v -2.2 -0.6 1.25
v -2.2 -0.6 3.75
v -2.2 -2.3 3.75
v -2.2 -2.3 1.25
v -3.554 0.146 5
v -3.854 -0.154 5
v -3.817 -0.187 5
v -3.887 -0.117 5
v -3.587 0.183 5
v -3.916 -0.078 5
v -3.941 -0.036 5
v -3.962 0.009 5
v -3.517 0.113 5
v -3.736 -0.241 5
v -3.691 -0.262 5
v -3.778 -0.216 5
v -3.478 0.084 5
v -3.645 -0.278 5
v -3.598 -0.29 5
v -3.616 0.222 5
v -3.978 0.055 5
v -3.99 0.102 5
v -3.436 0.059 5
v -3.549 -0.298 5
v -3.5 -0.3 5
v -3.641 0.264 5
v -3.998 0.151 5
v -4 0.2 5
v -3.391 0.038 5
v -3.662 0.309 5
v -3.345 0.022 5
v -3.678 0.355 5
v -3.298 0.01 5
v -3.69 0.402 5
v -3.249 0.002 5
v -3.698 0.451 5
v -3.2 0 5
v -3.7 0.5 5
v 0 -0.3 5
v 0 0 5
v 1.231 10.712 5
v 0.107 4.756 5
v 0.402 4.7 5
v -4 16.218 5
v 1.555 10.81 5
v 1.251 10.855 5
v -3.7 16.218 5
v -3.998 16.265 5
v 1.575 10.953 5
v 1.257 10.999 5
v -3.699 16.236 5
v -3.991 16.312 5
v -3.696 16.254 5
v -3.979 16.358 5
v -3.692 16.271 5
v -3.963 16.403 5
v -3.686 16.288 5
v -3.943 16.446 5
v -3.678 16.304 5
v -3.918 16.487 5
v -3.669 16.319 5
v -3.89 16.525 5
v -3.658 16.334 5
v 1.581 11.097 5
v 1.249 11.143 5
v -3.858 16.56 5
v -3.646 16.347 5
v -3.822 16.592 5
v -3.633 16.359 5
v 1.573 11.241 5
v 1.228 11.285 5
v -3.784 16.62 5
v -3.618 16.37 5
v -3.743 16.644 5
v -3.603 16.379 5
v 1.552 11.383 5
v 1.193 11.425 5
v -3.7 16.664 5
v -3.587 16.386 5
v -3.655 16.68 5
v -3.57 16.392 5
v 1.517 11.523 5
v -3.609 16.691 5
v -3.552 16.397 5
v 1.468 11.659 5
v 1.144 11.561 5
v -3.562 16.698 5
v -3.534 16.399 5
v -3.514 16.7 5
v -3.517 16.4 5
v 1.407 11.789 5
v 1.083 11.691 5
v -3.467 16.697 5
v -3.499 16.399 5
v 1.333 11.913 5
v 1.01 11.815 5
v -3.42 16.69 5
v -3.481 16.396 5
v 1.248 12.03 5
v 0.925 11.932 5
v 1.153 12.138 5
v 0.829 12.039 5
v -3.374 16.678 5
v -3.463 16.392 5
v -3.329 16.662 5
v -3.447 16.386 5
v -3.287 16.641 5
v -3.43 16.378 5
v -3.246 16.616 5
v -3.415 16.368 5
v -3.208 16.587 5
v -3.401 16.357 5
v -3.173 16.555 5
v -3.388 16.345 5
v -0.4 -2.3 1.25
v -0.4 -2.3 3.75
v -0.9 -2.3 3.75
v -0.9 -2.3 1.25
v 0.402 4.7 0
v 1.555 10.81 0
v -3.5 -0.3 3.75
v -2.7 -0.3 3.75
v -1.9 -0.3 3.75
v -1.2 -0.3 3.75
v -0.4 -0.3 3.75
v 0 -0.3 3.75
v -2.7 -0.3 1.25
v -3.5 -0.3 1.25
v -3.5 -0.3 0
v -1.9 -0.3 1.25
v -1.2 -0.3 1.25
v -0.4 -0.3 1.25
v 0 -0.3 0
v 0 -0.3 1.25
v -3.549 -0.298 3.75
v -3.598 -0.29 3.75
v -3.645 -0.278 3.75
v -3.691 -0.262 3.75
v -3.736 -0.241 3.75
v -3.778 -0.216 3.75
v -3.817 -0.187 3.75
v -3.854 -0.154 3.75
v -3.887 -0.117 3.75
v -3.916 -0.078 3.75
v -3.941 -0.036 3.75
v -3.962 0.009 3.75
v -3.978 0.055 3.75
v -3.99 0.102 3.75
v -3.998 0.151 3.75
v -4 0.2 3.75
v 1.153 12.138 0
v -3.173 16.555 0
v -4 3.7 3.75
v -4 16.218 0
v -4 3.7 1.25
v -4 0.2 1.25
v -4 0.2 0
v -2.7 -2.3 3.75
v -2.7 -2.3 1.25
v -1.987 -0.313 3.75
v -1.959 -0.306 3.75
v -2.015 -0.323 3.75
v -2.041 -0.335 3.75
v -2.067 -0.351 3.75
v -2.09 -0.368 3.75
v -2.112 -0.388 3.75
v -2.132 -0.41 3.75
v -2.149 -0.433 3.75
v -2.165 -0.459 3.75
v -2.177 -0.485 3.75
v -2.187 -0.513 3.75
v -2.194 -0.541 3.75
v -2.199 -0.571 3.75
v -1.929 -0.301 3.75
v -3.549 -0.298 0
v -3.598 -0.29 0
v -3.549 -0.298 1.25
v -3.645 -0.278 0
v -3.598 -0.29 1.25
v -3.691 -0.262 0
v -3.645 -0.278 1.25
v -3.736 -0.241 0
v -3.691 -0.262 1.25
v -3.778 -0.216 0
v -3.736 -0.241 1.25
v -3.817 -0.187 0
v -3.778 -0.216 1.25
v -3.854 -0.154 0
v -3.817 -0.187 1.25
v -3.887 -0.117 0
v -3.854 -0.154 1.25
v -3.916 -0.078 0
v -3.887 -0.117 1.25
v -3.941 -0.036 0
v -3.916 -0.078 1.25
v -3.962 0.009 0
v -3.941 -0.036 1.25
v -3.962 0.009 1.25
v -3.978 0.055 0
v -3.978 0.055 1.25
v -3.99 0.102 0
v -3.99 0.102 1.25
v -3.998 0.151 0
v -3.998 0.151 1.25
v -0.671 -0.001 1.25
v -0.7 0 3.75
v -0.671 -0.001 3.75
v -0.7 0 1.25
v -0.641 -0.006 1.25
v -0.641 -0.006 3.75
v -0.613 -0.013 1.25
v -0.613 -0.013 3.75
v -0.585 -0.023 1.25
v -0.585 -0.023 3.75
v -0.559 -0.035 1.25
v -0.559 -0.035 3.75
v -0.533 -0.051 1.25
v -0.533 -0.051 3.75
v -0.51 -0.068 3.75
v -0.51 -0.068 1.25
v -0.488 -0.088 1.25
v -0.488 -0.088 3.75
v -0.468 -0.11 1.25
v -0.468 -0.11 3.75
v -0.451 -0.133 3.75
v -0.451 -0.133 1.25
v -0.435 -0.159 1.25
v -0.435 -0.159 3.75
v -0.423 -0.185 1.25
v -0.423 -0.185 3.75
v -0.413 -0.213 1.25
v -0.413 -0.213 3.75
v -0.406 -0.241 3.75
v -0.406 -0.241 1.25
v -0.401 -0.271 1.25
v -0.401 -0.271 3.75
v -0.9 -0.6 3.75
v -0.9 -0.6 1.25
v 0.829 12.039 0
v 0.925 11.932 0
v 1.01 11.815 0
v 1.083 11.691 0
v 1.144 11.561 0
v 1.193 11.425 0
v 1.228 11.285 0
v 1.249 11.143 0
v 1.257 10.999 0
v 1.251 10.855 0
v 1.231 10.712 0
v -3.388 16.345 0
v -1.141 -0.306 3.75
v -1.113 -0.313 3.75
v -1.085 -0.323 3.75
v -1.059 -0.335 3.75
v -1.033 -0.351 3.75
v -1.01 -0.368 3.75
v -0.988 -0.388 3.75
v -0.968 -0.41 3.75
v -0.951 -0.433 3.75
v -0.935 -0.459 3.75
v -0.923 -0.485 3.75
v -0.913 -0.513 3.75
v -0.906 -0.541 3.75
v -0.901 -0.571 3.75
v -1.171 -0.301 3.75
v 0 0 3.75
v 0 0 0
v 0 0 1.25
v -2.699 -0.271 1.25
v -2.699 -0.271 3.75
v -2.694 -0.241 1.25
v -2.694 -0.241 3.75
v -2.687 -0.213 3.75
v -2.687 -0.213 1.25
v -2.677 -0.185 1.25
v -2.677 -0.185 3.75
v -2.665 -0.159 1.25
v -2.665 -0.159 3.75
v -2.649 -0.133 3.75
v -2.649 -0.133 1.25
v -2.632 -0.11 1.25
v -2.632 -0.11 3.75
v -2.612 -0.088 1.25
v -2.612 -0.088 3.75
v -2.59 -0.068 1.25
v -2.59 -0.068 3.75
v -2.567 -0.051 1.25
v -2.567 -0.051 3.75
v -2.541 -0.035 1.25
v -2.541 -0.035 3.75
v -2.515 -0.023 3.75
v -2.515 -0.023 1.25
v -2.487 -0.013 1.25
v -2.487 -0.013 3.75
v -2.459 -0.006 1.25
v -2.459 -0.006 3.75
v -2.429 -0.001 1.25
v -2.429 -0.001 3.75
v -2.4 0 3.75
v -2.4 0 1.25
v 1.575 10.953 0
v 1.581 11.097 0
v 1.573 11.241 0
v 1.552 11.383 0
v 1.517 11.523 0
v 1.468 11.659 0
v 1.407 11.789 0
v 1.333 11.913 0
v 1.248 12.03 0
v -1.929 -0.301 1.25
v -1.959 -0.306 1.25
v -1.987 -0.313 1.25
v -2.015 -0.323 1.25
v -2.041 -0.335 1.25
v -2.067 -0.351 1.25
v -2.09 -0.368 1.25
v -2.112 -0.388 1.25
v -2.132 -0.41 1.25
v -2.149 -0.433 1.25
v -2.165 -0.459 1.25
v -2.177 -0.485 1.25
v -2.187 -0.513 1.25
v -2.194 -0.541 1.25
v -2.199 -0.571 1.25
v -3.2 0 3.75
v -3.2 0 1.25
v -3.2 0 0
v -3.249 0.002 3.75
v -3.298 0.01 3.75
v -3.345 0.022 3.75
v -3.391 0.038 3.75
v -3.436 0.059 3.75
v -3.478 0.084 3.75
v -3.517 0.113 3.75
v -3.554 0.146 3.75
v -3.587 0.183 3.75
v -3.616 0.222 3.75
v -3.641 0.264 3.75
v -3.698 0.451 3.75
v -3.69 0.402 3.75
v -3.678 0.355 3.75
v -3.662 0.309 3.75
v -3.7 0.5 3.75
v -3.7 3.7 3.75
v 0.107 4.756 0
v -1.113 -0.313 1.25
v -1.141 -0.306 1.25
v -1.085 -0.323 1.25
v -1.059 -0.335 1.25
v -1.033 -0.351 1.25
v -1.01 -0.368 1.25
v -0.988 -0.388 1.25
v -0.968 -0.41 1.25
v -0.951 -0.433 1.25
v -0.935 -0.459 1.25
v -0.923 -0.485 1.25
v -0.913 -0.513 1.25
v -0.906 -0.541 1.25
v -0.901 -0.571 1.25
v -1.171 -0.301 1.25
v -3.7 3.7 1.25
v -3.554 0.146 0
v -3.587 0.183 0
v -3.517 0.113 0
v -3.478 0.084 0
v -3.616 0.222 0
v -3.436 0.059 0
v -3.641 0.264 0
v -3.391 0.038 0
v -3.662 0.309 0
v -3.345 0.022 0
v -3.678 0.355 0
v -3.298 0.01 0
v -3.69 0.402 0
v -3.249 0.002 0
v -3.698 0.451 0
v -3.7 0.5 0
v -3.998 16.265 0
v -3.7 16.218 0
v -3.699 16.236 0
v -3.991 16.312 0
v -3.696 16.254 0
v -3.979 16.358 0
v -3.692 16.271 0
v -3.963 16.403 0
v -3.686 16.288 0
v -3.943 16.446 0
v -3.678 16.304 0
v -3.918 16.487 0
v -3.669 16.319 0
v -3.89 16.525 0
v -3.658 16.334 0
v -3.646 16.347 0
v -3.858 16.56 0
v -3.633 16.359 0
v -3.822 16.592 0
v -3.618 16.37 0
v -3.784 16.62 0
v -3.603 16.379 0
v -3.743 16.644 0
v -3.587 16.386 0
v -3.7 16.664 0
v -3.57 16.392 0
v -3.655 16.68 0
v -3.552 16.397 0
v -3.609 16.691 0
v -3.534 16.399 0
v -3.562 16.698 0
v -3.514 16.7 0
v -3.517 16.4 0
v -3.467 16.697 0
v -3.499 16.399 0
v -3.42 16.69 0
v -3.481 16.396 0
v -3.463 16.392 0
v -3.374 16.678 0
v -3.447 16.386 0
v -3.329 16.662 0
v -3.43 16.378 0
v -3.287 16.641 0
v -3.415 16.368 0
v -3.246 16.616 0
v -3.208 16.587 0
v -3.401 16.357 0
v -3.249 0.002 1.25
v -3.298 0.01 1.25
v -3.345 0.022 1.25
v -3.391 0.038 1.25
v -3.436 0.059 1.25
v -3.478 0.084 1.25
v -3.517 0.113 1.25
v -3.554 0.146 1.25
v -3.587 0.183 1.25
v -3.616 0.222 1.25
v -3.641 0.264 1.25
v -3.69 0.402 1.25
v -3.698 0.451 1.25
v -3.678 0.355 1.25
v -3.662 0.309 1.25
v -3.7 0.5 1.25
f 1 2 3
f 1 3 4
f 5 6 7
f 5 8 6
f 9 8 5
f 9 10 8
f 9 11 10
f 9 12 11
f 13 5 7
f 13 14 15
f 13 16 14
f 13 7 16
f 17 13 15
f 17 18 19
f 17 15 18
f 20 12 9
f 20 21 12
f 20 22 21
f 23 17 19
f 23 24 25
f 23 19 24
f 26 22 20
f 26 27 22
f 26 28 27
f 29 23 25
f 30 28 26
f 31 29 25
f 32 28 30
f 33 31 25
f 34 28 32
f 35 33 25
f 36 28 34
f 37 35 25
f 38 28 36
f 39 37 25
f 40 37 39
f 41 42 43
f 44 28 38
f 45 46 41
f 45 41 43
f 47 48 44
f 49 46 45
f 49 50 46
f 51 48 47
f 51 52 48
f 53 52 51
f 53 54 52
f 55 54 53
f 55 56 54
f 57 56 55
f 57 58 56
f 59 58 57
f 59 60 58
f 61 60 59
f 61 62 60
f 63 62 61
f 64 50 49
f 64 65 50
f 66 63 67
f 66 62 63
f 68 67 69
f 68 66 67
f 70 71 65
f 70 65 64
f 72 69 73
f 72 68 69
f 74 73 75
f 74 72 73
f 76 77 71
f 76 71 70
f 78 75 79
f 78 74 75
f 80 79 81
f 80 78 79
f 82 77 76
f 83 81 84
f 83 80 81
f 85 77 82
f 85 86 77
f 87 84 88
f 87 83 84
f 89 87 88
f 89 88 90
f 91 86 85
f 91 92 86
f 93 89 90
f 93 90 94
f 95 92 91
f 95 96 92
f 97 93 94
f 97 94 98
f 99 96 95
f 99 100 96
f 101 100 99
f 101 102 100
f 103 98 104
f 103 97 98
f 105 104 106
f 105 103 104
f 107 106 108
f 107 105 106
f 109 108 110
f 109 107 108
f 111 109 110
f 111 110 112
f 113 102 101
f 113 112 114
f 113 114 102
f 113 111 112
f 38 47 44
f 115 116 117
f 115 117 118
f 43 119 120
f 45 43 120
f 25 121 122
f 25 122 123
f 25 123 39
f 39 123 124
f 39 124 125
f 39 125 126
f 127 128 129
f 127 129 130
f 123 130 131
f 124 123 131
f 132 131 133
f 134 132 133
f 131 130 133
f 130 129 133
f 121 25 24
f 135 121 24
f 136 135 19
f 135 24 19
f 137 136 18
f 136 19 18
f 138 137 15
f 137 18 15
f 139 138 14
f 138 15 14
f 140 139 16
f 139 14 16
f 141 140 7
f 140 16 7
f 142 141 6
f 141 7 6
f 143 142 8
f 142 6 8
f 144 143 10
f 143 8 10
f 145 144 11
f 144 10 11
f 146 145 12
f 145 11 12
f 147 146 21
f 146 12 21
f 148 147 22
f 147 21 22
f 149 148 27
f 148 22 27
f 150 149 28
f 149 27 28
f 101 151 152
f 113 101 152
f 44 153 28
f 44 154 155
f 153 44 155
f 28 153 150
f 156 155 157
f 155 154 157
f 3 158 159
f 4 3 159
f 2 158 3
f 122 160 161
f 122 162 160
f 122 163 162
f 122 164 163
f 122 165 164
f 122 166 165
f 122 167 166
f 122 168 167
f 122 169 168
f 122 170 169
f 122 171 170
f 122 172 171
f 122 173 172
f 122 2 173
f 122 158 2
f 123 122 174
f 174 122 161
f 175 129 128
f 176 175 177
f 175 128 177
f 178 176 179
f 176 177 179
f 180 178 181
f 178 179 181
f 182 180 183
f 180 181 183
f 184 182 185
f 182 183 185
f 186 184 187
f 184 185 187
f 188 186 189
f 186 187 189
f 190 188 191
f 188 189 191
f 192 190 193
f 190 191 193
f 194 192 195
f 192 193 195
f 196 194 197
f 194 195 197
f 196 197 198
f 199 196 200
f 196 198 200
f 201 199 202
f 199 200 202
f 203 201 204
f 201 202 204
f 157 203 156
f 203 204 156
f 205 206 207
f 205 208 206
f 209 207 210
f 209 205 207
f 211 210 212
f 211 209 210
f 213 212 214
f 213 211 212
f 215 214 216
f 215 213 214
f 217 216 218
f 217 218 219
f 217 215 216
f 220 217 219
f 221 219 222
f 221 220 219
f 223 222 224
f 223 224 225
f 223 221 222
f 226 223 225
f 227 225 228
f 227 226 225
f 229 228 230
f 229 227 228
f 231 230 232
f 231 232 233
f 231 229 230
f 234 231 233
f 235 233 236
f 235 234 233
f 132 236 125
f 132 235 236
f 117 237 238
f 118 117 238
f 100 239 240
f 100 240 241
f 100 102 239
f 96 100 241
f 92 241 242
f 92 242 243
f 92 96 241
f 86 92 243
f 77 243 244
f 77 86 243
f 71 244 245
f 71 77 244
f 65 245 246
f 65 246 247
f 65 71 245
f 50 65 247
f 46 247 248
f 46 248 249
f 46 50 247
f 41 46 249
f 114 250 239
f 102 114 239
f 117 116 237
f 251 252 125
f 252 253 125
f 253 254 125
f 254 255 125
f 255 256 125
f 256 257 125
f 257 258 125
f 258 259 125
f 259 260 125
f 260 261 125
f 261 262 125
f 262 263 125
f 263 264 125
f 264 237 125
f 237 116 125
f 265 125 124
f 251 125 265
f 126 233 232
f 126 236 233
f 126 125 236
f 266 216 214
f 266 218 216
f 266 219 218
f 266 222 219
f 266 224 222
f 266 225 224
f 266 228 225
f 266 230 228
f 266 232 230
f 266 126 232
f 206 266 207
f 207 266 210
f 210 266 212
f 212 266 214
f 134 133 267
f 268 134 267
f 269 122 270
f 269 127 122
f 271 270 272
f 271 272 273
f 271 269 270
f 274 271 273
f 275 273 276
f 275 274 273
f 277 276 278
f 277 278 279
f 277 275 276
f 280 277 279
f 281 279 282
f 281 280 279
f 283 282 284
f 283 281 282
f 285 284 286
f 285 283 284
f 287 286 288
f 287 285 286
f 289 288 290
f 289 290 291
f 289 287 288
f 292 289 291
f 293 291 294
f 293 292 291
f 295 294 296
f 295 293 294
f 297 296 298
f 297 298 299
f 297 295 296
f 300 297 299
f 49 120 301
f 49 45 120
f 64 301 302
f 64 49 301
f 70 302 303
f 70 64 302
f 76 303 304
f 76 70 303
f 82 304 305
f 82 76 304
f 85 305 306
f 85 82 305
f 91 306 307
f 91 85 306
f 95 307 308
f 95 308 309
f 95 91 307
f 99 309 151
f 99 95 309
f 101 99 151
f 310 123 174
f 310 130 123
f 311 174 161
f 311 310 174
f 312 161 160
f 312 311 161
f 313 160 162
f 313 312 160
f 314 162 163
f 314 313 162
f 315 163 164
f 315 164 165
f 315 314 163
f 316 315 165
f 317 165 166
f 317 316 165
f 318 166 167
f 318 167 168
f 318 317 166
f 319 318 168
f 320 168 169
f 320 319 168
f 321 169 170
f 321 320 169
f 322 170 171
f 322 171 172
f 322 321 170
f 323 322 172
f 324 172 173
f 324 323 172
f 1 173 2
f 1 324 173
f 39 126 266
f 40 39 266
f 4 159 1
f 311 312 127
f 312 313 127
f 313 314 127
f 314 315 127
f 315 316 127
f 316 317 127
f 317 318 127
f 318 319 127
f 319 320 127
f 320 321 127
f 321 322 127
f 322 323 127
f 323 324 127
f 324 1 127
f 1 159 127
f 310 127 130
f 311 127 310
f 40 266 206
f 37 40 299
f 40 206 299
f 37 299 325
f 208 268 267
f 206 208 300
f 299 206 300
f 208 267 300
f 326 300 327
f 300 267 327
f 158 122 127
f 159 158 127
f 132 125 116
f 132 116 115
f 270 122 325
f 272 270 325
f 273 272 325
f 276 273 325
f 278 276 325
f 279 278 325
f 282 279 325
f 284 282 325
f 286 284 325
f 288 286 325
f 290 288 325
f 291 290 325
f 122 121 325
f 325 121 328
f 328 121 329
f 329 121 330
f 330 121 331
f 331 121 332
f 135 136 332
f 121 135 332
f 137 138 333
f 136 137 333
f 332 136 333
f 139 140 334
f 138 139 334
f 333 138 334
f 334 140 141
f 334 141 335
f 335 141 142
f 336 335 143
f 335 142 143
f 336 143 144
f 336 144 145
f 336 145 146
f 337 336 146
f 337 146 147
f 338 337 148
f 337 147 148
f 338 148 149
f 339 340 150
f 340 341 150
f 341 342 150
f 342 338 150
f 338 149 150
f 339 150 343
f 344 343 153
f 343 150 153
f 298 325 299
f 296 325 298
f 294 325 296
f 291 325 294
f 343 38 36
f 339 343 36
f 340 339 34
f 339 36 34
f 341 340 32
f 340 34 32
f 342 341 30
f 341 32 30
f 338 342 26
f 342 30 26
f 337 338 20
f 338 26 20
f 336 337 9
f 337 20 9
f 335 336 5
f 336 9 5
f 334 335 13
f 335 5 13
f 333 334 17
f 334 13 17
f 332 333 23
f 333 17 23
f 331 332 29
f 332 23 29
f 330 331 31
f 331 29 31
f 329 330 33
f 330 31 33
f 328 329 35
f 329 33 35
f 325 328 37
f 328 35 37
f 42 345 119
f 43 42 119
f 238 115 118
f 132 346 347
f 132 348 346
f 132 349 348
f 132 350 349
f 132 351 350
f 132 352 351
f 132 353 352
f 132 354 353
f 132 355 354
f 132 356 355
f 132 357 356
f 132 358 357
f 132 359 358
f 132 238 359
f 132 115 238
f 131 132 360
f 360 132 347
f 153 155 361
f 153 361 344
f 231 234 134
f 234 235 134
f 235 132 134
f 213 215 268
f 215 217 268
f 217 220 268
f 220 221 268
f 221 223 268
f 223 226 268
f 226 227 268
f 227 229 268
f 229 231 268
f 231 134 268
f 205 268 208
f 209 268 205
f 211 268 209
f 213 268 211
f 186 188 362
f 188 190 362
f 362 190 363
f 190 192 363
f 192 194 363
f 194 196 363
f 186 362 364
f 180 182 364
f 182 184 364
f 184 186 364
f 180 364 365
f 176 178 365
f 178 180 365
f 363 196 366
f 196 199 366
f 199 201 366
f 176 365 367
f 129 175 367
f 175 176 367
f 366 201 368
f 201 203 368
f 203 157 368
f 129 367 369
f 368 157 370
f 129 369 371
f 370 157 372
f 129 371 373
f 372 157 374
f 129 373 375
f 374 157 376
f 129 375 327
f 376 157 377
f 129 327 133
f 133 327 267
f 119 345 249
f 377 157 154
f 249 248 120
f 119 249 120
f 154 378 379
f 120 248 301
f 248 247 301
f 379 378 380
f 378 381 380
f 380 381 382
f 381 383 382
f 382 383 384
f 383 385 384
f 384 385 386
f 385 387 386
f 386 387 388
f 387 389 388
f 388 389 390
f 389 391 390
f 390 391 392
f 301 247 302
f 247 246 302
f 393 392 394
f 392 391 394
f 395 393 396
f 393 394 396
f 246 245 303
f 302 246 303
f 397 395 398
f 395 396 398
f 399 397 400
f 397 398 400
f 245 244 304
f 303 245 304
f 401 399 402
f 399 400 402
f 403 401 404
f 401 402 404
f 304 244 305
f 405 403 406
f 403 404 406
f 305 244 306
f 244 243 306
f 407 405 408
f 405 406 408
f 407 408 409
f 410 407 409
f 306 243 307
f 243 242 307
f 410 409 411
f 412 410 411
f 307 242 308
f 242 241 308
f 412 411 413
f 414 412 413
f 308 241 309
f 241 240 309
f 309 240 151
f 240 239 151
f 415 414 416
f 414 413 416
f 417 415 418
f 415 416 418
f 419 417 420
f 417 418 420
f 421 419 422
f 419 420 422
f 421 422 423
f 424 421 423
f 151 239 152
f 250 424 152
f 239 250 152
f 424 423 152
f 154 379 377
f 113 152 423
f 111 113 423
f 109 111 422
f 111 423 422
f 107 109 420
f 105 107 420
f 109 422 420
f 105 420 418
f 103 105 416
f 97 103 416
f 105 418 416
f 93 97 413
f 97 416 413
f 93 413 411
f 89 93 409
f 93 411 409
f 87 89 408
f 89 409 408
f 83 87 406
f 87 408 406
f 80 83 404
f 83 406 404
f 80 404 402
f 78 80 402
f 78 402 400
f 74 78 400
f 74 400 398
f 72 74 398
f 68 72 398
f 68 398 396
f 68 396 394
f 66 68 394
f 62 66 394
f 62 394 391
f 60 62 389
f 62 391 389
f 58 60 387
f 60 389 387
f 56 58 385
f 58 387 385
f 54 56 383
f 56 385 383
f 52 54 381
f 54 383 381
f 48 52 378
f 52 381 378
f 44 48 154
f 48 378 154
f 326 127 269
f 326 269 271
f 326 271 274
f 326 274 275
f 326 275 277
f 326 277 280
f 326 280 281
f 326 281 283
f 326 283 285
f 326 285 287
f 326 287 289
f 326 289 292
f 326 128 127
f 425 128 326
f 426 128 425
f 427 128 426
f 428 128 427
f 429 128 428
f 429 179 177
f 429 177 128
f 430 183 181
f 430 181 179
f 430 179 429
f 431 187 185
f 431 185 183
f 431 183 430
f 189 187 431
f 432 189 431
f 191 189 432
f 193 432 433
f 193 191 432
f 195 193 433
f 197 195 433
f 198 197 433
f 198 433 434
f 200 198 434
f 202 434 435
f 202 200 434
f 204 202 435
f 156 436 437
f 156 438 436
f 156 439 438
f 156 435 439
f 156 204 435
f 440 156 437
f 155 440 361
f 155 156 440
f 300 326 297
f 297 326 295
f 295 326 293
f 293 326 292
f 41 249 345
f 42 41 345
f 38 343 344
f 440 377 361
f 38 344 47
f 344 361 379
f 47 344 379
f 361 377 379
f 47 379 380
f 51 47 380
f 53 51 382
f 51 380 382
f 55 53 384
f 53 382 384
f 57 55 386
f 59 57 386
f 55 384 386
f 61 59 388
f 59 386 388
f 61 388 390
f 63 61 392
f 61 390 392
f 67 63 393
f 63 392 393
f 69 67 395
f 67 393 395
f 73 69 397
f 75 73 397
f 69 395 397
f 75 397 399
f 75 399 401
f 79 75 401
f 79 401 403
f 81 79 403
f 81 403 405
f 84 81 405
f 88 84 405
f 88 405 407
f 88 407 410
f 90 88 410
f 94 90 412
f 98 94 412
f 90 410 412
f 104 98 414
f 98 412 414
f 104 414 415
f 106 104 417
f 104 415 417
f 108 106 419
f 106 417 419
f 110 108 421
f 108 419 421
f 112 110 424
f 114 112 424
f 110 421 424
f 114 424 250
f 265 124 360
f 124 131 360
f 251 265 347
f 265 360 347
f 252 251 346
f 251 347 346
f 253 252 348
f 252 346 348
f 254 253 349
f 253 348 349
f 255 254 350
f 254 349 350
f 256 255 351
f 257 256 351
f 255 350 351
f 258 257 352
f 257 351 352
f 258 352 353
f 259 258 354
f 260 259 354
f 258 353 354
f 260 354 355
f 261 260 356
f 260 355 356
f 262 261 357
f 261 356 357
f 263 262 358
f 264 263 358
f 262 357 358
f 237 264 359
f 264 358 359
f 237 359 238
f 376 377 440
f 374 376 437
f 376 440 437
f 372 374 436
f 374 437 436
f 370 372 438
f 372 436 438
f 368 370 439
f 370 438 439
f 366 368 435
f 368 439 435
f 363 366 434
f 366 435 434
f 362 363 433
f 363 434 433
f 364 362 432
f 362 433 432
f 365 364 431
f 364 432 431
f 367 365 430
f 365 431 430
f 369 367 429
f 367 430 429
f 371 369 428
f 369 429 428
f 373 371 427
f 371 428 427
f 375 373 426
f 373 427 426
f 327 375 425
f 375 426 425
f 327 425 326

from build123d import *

# Parameters (mm, degrees)
BOSS_EXTRU_1_DEPTH      = 5
CONG_2_R                = 1.5
CONG_3_R                = 0.5
ESQUISSE3_W             = 2.5
ESQUISSE3_H             = 4
ENL_V_MAT_EXTRU_1_DEPTH = 1.3
ESQUISSE4_W             = 2.5
ESQUISSE4_H             = 0.3
ENL_V_MAT_EXTRU_2_DEPTH = 0.4
ESQUISSE5_W             = 2.5
ESQUISSE5_H             = 2
BOSS_EXTRU_2_DEPTH      = 0.5
CONG_4_R                = 0.3


with BuildPart() as part:
    # Esquisse2 → Boss.-Extru.1 (new body)
    with BuildSketch(Plane.XY):
        with BuildLine():
            Line((0, 0), (-3.7, 0))
            Line((-3.7, 0), (-3.7, 16.217812561))
            ThreePointArc((-3.7, 16.217812561), (-3.586649408, 16.386494959), (-3.387643104, 16.345280892))
            Line((-3.387643104, 16.345280892), (1.376192195, 11.480497264))
            Line((1.376192195, 11.480497264), (0.107236318, 4.755627118))
            Line((0.107236318, 4.755627118), (0.402033916, 4.7))
            Line((0.402033916, 4.7), (1.7, 11.578610619))
            Line((1.7, 11.578610619), (-3.173298816, 16.555177357))
            ThreePointArc((-3.173298816, 16.555177357), (-3.7, 16.664256805), (-4, 16.217812561))
            Line((-4, 16.217812561), (-4, -0.3))
            Line((-4, -0.3), (0, -0.3))
            Line((0, -0.3), (0, 0))
        make_face()
    extrude(amount=BOSS_EXTRU_1_DEPTH)

    # Congé2
    cong_2_edges = [part.edges().sort_by_distance(p)[0] for p in [
        (1.376192195, 11.480497264, 2.5),
        (1.7, 11.578610619, 2.5),
    ]]
    fillet(cong_2_edges, radius=CONG_2_R)

    # Congé3
    cong_3_edges = [part.edges().sort_by_distance(p)[0] for p in [
        (-3.7, 0, 2.5),
        (-4, -0.3, 2.5),
    ]]
    fillet(cong_3_edges, radius=CONG_3_R)

    # Esquisse3 → Enlèv. mat.-Extru.1 (cut)
    with BuildSketch(Plane.ZY.offset(4)):
        with Locations((2.5, 1.7)):
            Rectangle(ESQUISSE3_W, ESQUISSE3_H)
    extrude(amount=-ENL_V_MAT_EXTRU_1_DEPTH, mode=Mode.SUBTRACT)

    # Esquisse4 → Enlèv. mat.-Extru.2 (cut)
    with BuildSketch(Plane(origin=(0, 0, 0), x_dir=(0, 0, -1), z_dir=(1, 0, 0))):
        with Locations((-2.5, -0.15)):
            Rectangle(ESQUISSE4_W, ESQUISSE4_H)
    extrude(amount=-ENL_V_MAT_EXTRU_2_DEPTH, mode=Mode.SUBTRACT)

    # Esquisse5 → Boss.-Extru.2 (add)
    with BuildSketch(Plane(origin=(-0.4, 0, 0), x_dir=(0, 0, -1), z_dir=(1, 0, 0))):
        with Locations((-2.5, -1.3)):
            Rectangle(ESQUISSE5_W, ESQUISSE5_H)
    boss_extru_2 = extrude(amount=-BOSS_EXTRU_2_DEPTH)

    # Symétrie1: Boss.-Extru.2 across plane
    add(boss_extru_2.mirror(Plane(origin=(-1.55, 0, 0), x_dir=(0, 0, 1), z_dir=(1, 0, 0))))

    # Congé4
    cong_4_edges = [part.edges().sort_by_distance(p)[0] for p in [
        (-0.4, 0, 2.5),
        (-2.7, 0, 2.5),
        (-0.9, -0.3, 2.5),
        (-2.2, -0.3, 2.5),
    ]]
    fillet(cong_4_edges, radius=CONG_4_R)


solid = part.part
